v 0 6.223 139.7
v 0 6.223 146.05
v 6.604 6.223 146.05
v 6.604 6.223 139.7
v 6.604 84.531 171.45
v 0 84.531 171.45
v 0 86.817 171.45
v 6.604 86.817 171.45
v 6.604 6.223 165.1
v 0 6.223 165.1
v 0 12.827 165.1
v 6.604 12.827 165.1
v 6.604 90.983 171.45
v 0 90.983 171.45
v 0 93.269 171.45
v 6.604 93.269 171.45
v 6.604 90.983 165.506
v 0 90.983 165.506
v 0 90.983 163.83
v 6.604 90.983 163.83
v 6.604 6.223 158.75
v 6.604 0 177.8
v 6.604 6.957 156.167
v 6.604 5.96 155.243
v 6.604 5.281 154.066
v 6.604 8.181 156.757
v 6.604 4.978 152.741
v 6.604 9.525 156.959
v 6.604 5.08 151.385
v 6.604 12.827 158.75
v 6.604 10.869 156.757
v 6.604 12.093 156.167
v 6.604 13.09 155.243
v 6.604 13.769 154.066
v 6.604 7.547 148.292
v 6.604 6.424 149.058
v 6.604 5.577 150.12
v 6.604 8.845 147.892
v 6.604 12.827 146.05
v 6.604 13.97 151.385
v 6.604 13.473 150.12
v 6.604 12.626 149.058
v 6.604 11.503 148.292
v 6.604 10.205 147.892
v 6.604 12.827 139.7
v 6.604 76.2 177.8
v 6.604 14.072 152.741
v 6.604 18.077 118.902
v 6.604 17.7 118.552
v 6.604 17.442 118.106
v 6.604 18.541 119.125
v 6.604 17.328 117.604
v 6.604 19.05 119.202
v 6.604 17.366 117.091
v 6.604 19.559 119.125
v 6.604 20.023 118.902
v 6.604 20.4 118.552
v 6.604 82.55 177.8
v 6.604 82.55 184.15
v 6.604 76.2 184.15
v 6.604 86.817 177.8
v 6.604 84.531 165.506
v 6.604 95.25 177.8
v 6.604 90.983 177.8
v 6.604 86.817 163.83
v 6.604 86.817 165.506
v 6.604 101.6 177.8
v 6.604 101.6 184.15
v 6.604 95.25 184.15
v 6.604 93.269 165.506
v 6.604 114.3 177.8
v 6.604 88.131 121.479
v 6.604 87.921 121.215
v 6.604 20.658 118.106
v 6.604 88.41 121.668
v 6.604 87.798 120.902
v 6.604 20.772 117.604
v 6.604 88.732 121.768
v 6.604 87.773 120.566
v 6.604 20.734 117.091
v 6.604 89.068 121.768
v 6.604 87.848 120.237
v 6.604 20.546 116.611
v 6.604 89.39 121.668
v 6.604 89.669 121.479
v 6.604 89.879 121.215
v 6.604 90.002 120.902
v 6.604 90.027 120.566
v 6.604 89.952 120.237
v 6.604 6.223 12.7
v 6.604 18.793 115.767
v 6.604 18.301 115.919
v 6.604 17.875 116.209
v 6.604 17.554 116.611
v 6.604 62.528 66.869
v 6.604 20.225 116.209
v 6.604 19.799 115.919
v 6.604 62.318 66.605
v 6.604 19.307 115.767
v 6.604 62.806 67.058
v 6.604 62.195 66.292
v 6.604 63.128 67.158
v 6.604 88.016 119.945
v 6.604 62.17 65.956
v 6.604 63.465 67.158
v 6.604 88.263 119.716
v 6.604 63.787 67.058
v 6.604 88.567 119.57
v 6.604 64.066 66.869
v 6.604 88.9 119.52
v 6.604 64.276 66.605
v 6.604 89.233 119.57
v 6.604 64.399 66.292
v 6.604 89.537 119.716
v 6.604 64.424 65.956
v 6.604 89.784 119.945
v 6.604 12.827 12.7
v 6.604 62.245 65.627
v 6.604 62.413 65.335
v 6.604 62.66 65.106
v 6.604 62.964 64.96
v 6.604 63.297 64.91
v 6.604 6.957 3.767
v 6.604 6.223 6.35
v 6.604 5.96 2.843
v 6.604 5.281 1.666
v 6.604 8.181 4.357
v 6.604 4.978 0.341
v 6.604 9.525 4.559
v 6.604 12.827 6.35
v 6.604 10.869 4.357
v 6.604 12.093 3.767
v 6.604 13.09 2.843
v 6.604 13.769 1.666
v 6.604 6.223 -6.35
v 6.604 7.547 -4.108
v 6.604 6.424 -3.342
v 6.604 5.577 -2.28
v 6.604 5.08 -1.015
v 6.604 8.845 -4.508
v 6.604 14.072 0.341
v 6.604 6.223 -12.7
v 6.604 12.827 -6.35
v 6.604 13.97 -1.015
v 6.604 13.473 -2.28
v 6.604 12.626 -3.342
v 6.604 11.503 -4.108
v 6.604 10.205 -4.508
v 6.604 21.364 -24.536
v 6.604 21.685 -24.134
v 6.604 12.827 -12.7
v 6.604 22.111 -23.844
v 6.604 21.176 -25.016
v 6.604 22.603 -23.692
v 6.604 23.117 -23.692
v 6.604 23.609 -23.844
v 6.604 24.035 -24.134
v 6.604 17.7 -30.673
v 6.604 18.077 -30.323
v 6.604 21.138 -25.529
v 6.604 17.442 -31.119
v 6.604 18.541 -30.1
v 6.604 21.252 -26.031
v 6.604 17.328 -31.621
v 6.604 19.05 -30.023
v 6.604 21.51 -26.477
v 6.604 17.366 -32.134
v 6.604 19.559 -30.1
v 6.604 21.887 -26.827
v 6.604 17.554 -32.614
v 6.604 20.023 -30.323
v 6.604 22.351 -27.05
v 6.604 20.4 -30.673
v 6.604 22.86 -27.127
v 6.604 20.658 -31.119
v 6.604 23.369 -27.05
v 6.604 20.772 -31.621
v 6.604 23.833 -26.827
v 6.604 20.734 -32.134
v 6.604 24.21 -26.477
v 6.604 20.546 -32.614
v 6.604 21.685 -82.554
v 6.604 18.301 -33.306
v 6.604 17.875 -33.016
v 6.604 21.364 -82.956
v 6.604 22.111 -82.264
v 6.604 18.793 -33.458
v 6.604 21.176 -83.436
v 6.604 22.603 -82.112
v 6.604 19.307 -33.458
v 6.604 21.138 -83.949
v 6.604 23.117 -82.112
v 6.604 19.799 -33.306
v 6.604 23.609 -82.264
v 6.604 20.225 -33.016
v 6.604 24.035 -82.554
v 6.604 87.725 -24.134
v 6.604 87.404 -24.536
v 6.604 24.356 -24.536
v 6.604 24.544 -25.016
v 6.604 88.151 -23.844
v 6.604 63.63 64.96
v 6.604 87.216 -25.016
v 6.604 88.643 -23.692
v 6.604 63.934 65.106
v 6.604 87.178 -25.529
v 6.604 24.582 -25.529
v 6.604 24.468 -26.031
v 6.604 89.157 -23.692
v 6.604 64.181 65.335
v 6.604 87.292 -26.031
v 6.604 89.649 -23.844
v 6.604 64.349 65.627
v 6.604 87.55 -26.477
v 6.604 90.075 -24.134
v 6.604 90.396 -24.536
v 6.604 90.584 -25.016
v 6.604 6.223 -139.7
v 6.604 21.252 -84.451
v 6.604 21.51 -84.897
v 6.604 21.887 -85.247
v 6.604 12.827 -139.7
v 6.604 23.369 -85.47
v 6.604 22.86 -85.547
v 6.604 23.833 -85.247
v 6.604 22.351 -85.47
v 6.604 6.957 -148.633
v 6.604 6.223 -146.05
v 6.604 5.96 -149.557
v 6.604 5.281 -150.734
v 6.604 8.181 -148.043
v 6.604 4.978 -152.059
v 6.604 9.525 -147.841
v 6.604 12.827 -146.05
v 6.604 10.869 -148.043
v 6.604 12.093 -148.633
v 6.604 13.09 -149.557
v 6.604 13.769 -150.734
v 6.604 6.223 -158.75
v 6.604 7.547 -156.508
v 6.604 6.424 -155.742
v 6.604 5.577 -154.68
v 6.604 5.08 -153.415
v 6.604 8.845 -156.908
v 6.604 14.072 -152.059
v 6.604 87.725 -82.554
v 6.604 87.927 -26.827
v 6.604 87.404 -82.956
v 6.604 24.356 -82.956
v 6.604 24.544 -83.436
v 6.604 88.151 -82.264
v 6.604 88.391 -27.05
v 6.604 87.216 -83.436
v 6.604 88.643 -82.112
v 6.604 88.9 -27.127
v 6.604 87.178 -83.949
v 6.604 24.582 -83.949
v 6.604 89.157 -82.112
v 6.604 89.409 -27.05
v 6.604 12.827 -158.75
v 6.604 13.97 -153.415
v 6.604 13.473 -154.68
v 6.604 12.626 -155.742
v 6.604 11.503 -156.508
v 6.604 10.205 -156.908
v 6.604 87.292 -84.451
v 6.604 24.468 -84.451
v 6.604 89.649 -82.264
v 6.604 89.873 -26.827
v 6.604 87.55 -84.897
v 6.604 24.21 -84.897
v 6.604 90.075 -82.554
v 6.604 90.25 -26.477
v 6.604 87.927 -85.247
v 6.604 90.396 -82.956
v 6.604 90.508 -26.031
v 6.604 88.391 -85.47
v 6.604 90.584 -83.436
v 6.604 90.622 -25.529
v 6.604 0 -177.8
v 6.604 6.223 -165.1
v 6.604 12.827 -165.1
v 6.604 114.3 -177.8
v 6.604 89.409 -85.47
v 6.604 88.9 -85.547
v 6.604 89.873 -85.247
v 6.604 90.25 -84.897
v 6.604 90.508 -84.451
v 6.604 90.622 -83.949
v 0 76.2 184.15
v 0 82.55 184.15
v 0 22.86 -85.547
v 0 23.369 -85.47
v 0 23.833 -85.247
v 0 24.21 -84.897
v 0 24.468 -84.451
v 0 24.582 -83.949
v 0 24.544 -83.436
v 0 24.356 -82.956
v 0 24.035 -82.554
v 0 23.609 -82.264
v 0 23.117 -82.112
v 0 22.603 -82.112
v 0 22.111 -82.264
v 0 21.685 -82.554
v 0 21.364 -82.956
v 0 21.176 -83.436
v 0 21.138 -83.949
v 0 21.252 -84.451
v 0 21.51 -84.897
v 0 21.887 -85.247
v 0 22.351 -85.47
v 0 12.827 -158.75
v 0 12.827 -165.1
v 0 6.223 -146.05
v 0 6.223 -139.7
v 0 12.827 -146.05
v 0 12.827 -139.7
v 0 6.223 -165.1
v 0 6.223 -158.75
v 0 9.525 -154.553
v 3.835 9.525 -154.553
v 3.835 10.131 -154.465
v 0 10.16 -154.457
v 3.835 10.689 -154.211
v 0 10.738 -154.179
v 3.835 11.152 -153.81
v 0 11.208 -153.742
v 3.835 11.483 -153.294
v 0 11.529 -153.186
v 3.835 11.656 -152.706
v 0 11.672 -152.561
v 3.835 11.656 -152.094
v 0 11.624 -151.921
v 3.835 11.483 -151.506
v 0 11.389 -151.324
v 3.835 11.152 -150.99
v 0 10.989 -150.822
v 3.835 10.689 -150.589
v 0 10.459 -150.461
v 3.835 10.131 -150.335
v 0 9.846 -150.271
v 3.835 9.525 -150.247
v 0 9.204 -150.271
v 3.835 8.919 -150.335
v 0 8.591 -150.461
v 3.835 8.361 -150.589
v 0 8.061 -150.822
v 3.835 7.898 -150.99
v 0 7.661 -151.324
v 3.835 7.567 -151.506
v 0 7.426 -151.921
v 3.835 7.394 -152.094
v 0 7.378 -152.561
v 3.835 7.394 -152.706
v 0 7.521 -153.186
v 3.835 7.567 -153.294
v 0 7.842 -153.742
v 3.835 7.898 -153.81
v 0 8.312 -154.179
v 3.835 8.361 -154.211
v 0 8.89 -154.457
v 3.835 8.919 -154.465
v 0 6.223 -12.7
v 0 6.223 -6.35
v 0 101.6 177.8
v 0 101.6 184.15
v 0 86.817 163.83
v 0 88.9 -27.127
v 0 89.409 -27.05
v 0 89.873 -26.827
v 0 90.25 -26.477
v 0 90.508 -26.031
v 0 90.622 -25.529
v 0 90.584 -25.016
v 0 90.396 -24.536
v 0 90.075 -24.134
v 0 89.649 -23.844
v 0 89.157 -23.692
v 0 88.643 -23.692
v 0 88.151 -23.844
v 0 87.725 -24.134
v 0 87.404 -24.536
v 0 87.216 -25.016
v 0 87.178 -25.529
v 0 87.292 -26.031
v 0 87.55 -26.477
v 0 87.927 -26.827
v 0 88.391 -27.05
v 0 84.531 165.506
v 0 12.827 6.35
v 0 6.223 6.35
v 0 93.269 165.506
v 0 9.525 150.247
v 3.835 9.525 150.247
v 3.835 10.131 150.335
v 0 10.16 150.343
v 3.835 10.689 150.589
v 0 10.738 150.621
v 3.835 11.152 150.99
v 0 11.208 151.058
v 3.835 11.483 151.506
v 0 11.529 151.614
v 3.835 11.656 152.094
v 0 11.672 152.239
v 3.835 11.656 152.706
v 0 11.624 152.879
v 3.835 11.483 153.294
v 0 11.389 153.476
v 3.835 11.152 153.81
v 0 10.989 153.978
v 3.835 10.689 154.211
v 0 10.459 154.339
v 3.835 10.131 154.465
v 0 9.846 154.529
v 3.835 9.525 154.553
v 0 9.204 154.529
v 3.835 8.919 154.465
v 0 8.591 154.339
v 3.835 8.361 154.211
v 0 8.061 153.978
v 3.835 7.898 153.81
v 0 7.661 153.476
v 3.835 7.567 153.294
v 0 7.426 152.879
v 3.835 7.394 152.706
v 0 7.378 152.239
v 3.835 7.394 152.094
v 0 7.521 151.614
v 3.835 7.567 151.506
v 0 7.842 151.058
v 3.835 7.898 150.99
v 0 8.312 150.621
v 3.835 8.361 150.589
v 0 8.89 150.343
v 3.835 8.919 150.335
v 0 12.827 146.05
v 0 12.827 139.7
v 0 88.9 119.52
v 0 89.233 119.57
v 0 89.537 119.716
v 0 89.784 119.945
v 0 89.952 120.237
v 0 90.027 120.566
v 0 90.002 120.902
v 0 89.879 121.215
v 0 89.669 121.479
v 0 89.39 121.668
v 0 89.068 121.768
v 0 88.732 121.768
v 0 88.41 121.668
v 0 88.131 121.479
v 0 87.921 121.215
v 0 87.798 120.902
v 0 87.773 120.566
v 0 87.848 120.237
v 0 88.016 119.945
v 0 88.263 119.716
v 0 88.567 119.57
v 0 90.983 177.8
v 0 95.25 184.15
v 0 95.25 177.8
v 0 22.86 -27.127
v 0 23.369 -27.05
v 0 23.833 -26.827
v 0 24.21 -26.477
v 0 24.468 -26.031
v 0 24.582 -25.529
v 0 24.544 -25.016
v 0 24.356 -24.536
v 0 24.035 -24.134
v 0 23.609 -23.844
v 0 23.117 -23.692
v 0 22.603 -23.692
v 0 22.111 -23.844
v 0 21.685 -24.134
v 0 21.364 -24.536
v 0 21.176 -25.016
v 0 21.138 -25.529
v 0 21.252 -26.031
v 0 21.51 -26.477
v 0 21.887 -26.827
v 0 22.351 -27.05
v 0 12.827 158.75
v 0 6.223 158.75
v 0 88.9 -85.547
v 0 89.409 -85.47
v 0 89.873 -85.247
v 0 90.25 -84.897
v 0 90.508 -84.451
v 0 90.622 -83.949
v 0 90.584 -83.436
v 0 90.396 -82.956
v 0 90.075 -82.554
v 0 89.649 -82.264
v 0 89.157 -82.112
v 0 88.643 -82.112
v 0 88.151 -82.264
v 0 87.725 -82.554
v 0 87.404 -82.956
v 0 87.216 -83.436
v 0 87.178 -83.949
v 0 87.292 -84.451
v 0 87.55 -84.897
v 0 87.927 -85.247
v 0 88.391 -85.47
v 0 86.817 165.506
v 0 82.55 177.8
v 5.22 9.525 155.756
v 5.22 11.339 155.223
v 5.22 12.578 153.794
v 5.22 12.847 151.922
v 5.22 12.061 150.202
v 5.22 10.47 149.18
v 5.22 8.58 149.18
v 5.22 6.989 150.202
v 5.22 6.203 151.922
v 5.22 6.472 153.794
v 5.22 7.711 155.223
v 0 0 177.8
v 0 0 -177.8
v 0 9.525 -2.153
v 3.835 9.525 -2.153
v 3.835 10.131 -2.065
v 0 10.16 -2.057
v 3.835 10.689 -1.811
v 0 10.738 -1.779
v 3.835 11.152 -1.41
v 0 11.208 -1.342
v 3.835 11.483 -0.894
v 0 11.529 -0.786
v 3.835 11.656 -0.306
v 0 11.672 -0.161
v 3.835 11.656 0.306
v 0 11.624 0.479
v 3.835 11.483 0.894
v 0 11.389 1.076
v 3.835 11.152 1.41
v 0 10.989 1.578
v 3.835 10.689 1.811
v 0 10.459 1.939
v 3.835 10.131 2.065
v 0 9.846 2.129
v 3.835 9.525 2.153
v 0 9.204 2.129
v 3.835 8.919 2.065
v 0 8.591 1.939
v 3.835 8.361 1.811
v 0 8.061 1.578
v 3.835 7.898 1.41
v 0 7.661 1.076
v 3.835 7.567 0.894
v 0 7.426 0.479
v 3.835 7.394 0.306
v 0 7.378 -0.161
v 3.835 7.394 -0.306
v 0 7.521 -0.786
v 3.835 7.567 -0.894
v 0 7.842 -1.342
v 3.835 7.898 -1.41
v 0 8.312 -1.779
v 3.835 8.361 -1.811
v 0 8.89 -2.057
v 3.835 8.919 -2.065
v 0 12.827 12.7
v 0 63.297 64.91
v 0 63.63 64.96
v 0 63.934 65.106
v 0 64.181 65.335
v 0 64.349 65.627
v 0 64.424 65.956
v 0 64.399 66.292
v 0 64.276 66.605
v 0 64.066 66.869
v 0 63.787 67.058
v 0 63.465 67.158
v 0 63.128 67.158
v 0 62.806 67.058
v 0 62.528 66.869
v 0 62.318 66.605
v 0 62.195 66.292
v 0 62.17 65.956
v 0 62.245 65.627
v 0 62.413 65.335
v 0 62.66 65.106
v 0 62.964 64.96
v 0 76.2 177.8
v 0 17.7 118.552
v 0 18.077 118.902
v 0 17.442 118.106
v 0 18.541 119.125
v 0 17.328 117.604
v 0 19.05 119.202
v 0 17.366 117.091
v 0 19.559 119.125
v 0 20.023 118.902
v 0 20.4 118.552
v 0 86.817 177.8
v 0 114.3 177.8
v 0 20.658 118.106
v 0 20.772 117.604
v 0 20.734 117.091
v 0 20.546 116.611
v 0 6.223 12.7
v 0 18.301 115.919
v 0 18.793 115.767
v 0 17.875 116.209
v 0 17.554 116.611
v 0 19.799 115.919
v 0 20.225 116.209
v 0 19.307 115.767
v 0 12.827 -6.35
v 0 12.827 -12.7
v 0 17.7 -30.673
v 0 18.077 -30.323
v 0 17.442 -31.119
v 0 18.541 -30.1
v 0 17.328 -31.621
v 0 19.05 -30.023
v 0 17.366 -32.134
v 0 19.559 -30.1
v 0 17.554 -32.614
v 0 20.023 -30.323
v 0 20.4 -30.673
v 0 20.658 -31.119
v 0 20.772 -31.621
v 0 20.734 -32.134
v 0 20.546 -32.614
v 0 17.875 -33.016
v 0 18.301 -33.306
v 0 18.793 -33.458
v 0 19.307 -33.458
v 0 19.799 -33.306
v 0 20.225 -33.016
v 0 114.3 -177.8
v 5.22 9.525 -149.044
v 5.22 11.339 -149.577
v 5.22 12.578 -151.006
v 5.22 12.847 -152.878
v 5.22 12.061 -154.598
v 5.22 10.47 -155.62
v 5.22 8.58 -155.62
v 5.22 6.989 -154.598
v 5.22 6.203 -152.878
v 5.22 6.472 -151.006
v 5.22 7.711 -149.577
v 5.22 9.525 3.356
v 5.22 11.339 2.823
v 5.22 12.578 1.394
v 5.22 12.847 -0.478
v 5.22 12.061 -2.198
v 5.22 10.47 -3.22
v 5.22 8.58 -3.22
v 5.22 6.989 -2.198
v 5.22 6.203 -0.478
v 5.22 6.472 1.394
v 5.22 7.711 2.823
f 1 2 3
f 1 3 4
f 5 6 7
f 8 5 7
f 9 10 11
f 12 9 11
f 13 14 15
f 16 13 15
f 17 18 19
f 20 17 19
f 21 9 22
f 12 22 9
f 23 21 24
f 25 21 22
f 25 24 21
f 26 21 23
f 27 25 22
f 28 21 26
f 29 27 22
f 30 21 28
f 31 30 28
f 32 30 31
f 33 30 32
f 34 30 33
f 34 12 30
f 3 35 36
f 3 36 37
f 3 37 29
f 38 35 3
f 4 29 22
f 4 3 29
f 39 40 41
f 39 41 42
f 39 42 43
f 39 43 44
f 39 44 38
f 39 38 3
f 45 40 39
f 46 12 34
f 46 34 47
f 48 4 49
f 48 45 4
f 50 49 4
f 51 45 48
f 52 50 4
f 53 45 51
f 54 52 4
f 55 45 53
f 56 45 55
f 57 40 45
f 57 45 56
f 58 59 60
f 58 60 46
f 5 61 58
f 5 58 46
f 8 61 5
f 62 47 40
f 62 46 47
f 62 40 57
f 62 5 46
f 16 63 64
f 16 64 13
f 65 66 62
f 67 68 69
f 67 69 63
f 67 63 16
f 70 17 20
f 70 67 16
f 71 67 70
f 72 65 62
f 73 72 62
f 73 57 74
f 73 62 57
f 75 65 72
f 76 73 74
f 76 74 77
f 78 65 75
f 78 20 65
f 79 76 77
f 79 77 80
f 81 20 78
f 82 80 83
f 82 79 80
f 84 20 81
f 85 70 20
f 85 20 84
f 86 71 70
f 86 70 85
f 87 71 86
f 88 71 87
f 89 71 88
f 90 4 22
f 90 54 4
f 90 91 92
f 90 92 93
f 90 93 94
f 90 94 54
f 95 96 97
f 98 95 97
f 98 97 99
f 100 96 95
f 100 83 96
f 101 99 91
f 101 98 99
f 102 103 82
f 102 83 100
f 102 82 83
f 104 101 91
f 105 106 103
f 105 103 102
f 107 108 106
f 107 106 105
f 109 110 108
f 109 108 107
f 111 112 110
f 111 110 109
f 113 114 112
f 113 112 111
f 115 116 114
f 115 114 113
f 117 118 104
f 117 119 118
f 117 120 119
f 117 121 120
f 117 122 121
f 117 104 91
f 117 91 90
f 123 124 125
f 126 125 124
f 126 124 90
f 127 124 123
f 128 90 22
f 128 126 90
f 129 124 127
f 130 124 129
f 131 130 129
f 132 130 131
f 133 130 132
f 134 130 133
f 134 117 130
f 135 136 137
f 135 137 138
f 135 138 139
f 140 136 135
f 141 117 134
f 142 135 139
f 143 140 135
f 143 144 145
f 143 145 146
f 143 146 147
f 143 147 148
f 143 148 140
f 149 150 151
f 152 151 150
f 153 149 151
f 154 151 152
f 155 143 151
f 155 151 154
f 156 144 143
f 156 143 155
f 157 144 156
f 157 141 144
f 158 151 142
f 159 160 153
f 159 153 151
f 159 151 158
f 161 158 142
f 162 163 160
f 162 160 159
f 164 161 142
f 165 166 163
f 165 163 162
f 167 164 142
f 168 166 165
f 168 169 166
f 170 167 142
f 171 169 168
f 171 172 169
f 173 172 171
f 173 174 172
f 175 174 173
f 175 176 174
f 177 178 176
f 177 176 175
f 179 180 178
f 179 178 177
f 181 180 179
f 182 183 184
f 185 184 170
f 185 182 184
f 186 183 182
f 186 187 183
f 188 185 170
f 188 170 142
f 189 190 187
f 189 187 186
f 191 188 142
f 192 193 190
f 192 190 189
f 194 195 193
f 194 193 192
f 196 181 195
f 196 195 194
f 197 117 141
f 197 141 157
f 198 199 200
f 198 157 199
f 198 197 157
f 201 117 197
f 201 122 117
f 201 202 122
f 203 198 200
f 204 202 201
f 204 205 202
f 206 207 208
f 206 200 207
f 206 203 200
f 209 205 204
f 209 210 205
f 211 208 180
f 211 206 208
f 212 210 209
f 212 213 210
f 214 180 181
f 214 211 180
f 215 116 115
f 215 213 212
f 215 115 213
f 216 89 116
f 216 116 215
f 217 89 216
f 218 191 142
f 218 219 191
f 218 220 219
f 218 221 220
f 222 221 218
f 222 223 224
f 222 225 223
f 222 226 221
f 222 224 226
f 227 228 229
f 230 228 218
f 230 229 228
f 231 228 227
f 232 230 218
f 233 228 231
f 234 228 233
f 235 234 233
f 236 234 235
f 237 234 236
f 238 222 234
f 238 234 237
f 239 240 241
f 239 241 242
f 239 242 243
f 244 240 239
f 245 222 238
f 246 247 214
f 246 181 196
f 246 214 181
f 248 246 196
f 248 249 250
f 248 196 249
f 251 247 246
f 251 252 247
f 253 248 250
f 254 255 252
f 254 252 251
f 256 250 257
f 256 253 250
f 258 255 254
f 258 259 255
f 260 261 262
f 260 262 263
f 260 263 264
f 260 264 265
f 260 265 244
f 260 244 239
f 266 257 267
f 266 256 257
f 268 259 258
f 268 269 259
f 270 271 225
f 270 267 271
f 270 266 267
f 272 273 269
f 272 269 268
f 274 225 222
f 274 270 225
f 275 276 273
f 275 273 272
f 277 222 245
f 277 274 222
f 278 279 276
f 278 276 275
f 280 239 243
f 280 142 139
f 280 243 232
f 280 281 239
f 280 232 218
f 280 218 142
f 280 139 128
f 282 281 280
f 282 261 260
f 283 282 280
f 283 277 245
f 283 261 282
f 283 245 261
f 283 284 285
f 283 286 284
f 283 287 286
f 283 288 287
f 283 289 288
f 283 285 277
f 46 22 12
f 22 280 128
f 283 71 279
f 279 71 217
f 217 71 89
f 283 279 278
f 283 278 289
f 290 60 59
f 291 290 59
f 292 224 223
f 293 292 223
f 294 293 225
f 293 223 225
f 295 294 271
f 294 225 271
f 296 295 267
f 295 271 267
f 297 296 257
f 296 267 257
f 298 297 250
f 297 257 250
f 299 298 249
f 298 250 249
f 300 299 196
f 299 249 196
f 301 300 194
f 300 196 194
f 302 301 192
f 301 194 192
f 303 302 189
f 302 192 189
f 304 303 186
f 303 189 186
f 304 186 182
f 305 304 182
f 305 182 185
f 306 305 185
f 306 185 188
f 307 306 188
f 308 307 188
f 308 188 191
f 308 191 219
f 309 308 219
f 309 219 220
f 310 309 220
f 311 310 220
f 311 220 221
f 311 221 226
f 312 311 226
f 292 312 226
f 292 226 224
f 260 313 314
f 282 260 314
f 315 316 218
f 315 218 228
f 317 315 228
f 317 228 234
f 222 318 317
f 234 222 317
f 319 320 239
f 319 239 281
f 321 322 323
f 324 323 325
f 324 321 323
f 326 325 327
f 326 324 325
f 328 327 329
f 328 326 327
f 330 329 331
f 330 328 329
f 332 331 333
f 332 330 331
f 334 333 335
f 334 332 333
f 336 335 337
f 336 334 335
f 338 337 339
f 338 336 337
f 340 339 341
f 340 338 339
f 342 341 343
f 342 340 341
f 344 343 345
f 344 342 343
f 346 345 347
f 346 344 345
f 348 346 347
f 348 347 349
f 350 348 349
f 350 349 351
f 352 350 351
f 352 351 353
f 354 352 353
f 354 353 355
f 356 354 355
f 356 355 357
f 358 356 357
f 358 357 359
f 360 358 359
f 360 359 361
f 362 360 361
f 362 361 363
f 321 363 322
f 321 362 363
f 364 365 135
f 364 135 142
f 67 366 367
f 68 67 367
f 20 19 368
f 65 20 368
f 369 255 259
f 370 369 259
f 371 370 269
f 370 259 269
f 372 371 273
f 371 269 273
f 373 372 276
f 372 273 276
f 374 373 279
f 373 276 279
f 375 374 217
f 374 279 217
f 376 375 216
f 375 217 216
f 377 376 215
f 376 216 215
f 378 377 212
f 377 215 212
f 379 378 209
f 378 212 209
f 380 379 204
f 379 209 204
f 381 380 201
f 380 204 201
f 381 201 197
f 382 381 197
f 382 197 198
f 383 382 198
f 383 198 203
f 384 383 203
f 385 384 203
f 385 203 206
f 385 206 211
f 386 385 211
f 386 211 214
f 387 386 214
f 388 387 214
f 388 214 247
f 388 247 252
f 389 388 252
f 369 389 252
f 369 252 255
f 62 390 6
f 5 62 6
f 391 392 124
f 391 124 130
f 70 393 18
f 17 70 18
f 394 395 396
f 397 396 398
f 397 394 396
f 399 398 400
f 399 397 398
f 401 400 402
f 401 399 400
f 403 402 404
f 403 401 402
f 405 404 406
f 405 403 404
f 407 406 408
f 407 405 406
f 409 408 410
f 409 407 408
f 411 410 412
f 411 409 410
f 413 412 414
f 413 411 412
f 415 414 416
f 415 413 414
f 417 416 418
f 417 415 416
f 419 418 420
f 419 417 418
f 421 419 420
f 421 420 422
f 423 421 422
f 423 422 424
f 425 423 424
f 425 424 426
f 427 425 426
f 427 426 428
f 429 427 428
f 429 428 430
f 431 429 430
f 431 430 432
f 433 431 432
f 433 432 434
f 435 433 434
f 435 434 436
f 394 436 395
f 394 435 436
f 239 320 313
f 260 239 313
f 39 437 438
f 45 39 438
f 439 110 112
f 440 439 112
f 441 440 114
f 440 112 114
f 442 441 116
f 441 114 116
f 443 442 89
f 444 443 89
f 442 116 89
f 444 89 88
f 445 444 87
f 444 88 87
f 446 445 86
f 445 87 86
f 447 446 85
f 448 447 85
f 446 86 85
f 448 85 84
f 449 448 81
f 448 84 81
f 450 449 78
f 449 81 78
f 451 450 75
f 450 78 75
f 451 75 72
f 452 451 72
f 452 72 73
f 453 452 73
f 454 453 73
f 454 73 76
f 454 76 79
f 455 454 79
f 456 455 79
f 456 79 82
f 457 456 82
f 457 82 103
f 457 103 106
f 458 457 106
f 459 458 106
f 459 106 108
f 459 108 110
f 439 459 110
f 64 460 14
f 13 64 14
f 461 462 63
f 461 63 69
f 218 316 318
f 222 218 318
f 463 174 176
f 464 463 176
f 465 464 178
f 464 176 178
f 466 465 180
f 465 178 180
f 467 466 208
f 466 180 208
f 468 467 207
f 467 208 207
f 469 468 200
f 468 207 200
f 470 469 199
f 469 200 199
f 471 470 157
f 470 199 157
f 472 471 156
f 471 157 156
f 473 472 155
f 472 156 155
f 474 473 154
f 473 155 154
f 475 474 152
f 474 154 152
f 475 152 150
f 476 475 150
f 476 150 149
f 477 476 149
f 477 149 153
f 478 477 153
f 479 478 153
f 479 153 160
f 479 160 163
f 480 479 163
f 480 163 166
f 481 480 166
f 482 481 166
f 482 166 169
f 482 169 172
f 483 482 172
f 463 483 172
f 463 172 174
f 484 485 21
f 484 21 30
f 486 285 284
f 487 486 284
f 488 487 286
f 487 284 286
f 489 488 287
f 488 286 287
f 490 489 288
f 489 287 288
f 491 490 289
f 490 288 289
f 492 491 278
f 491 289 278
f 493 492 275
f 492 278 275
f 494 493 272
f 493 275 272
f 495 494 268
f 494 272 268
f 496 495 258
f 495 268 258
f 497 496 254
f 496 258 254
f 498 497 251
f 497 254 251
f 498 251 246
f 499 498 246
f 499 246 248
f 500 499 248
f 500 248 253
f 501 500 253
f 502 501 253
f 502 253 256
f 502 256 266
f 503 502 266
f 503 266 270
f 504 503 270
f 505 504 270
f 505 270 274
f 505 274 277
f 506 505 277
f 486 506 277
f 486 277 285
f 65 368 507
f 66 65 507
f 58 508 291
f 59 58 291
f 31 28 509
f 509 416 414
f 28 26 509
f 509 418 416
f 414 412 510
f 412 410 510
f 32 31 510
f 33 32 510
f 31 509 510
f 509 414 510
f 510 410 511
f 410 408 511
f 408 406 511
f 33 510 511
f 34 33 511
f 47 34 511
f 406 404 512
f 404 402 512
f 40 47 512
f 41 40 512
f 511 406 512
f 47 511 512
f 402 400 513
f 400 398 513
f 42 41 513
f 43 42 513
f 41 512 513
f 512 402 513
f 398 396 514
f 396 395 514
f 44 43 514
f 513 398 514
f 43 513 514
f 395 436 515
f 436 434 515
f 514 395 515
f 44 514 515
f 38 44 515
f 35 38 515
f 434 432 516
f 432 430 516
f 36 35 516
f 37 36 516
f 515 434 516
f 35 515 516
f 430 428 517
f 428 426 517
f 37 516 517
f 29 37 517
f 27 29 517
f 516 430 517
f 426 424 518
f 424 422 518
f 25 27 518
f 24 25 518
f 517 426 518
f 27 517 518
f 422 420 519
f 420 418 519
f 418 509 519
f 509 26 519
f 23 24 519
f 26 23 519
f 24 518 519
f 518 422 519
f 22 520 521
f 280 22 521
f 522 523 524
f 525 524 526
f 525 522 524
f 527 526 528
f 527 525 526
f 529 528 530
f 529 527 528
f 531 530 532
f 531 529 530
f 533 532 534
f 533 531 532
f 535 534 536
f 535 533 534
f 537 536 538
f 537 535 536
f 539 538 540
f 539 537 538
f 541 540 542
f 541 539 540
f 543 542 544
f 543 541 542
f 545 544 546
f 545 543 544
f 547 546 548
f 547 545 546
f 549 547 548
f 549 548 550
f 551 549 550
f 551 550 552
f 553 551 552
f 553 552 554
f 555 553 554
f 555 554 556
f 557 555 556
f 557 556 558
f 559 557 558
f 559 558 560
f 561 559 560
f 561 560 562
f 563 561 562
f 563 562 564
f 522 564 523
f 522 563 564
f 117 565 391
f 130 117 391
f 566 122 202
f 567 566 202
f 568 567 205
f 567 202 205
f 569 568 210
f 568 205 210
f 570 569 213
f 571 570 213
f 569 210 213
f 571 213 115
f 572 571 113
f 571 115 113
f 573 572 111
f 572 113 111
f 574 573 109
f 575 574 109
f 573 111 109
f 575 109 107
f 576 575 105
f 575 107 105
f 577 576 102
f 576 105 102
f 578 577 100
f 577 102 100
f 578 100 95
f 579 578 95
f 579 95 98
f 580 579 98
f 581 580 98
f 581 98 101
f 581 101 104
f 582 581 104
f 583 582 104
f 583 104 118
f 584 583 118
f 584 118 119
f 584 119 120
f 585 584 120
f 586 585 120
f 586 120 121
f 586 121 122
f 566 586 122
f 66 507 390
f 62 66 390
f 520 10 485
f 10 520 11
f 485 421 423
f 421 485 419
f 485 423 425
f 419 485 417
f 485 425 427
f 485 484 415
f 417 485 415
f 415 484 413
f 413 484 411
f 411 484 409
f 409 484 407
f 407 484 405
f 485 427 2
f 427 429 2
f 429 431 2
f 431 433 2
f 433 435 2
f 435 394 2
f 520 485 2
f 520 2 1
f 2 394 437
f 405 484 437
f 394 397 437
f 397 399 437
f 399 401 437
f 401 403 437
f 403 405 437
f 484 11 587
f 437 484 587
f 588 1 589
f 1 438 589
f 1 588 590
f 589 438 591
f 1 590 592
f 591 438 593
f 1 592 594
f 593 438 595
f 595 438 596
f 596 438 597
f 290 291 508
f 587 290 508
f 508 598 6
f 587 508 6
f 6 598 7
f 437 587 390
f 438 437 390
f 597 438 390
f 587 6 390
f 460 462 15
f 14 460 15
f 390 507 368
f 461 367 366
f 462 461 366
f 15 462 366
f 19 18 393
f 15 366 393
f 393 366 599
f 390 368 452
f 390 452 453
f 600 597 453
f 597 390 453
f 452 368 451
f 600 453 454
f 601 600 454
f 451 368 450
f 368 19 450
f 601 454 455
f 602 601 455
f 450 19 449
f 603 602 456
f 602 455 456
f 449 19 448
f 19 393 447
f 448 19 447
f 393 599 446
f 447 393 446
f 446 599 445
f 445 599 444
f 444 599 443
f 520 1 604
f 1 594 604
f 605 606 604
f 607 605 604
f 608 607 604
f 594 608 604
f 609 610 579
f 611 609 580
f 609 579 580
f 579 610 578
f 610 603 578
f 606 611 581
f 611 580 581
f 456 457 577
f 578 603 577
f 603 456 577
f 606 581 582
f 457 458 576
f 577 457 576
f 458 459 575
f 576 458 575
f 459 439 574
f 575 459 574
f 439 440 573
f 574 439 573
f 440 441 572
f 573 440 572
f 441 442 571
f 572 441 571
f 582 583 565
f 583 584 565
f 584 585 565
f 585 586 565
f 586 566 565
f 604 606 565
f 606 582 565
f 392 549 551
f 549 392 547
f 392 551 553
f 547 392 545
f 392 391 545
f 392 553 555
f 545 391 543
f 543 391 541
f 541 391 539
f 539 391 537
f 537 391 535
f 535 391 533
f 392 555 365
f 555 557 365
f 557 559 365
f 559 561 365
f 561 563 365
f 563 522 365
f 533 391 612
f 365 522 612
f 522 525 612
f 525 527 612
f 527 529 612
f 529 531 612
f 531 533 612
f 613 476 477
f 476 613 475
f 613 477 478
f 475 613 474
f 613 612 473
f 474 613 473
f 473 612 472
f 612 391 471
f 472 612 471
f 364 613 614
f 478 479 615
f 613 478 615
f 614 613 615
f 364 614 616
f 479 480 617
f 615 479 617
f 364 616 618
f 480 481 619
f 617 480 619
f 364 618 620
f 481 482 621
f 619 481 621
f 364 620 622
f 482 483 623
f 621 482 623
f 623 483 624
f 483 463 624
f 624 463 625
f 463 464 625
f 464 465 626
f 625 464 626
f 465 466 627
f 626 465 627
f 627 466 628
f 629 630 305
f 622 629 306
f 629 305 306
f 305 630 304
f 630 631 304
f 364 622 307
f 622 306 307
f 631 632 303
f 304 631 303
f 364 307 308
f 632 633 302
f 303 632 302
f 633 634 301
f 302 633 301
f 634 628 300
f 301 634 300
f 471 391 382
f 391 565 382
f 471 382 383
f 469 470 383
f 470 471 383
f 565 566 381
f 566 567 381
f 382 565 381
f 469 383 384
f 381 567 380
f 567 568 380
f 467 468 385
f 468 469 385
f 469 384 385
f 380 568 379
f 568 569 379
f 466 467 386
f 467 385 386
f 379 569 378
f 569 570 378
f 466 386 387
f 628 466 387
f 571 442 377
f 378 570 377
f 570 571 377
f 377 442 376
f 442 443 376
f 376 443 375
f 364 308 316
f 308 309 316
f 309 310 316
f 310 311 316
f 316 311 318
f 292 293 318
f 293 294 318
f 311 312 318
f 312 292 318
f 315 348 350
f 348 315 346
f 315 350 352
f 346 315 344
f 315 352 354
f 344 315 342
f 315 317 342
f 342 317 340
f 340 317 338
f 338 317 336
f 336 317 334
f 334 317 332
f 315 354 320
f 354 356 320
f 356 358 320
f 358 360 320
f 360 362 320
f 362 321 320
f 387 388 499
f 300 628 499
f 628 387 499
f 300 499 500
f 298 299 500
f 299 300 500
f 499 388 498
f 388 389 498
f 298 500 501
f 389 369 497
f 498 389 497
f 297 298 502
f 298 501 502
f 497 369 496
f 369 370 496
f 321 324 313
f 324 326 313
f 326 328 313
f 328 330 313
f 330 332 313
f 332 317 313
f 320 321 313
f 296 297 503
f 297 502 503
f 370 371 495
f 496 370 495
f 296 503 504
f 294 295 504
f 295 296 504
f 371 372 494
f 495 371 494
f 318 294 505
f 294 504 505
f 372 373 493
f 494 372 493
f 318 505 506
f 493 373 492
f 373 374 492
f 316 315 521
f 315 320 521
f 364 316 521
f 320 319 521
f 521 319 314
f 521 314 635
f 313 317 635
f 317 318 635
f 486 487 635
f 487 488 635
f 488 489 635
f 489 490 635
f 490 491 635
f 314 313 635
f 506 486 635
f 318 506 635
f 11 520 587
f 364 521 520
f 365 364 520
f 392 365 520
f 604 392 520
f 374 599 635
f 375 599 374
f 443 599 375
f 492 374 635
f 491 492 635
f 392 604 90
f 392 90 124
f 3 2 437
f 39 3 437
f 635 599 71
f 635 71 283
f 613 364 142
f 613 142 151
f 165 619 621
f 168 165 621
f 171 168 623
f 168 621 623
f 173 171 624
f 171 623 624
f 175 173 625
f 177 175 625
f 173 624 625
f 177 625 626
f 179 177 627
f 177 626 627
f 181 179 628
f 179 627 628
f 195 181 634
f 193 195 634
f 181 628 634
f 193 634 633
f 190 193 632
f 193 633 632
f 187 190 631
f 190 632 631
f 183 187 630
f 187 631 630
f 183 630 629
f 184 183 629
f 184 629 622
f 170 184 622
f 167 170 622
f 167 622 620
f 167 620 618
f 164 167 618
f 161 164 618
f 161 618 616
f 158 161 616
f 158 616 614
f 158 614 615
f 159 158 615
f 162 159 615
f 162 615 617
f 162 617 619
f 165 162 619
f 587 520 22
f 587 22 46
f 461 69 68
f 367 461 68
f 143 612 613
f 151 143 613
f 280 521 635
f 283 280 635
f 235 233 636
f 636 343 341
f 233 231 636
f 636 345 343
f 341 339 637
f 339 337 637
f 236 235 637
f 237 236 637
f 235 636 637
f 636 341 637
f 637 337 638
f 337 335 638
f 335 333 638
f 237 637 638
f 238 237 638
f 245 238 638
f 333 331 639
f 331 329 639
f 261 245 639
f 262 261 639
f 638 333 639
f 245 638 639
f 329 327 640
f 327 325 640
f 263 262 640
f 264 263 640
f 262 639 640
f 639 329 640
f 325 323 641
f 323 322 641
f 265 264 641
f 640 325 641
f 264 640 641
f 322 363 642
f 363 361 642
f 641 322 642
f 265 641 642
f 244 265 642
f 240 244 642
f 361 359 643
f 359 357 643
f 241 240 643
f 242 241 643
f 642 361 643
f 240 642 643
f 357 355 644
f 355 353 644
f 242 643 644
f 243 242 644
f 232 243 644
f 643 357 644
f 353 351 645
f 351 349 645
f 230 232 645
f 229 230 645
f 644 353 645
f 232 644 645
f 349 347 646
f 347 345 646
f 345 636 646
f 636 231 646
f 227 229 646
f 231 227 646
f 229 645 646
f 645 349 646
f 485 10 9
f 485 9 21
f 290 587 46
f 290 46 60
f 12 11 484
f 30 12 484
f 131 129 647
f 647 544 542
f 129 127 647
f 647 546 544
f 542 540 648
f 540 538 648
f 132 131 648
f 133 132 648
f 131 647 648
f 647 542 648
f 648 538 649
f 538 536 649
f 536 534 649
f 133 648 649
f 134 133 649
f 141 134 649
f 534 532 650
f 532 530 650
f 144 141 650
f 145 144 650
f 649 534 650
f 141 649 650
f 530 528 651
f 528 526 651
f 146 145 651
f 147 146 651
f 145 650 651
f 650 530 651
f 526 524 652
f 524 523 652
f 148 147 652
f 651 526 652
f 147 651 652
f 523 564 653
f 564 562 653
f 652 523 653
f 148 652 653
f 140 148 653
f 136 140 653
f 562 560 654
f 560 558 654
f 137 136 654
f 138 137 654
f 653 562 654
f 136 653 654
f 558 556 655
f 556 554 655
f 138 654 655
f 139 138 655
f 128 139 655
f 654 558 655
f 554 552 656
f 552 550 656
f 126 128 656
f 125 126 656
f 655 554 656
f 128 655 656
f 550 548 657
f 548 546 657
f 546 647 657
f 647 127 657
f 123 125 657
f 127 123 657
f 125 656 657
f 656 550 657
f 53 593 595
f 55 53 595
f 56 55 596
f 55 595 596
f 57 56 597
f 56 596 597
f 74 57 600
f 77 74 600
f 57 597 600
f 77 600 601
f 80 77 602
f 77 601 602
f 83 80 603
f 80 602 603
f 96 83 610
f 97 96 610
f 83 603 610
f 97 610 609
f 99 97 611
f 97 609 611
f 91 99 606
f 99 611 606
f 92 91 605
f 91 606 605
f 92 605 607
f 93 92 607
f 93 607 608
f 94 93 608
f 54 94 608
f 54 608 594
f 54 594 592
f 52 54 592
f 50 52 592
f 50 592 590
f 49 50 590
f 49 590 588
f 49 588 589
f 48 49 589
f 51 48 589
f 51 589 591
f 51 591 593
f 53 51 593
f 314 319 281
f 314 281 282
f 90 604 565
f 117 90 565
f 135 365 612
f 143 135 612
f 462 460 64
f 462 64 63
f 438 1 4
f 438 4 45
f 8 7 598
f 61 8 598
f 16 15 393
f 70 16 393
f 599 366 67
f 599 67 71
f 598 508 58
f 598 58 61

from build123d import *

# Parameters (mm, degrees)
SKETCH1_W                                         = 355.6
SKETCH1_H                                         = 114.3
SKETCH1_R                                         = 2.15265
SKETCH1_W_2                                       = 6.35
SKETCH1_H_2                                       = 6.604
BOSS_EXTRUDE1_DEPTH                               = 6.604
CUT_EXTRUDE1_DEPTH                                = 7.604
SKETCH6_W                                         = 6.35
SKETCH6_H                                         = 6.35
BOSS_EXTRUDE2_DEPTH                               = 6.604
CSK_FOR_8_FLAT_HEAD_SOCKET_CAP_SCREW2_D           = 4.3053
CSK_FOR_8_FLAT_HEAD_SOCKET_CAP_SCREW2_CSINK_D     = 9.1186
CSK_FOR_8_FLAT_HEAD_SOCKET_CAP_SCREW2_CSINK_ANGLE = 82
F_4_40_TAPPED_HOLE2_D                             = 2.2606
F_4_40_TAPPED_HOLE2_DEPTH                         = 7.5946
F_4_40_TAPPED_HOLE2_TIP                           = 0.679152758
F_8_32_TAPPED_HOLE1_D                             = 3.4544
F_8_32_TAPPED_HOLE1_DEPTH                         = 10.7188
F_8_32_TAPPED_HOLE1_TIP                           = 1.037806461
F_8_32_TAPPED_HOLE2_D                             = 3.4544
F_8_32_TAPPED_HOLE2_DEPTH                         = 10.7188
F_8_32_TAPPED_HOLE2_TIP                           = 1.037806461


with BuildPart() as part:
    # Sketch1 → Boss-Extrude1 (new body)
    with BuildSketch(Plane(origin=(0, 0, 0), x_dir=(0, 0, -1), z_dir=(1, 0, 0))):
        with Locations((0, 57.15)):
            Rectangle(SKETCH1_W, SKETCH1_H)
        with Locations((-152.4, 9.525)):
            Circle(SKETCH1_R, mode=Mode.SUBTRACT)
        with Locations((0, 9.525)):
            Circle(SKETCH1_R, mode=Mode.SUBTRACT)
        with Locations((152.4, 9.525)):
            Circle(SKETCH1_R, mode=Mode.SUBTRACT)
        with Locations((-142.875, 9.525)):
            Rectangle(SKETCH1_W_2, SKETCH1_H_2, mode=Mode.SUBTRACT)
        with Locations((-161.925, 9.525)):
            Rectangle(SKETCH1_W_2, SKETCH1_H_2, mode=Mode.SUBTRACT)
        with Locations((9.525, 9.525)):
            Rectangle(SKETCH1_W_2, SKETCH1_H_2, mode=Mode.SUBTRACT)
        with Locations((-9.525, 9.525)):
            Rectangle(SKETCH1_W_2, SKETCH1_H_2, mode=Mode.SUBTRACT)
        with Locations((161.925, 9.525)):
            Rectangle(SKETCH1_W_2, SKETCH1_H_2, mode=Mode.SUBTRACT)
        with Locations((142.875, 9.525)):
            Rectangle(SKETCH1_W_2, SKETCH1_H_2, mode=Mode.SUBTRACT)
    extrude(amount=BOSS_EXTRUDE1_DEPTH)

    # Sketch5 → Cut-Extrude1 (cut, through all)
    with BuildSketch(Plane.ZY):
        Polygon((177.8, 90.9828), (171.45, 90.9828), (171.45, 93.2688), (165.5064, 93.2688), (165.5064, 90.9828), (163.83, 90.9828), (163.83, 86.8172), (165.5064, 86.8172), (165.5064, 84.5312), (171.45, 84.5312), (171.45, 86.8172), (177.8, 86.8172), align=None)
    extrude(amount=-CUT_EXTRUDE1_DEPTH, mode=Mode.SUBTRACT)

    # Sketch6 → Boss-Extrude2 (add)
    with BuildSketch(Plane.ZY):
        with Locations((180.975, 98.425)):
            Rectangle(SKETCH6_W, SKETCH6_H)
        with Locations((180.975, 79.375)):
            Rectangle(SKETCH6_W, SKETCH6_H)
    extrude(amount=-BOSS_EXTRUDE2_DEPTH)

    # CSK for #8 Flat Head Socket Cap Screw2 (through all)
    with Locations(Plane(origin=(6.604, 0, 0), x_dir=(0, 0, -1), z_dir=(1, 0, 0))):
        with Locations((-152.4, 9.525), (0, 9.525), (152.4, 9.525)):
            CounterSinkHole(CSK_FOR_8_FLAT_HEAD_SOCKET_CAP_SCREW2_D / 2, CSK_FOR_8_FLAT_HEAD_SOCKET_CAP_SCREW2_CSINK_D / 2, counter_sink_angle=CSK_FOR_8_FLAT_HEAD_SOCKET_CAP_SCREW2_CSINK_ANGLE)

    # #4-40 Tapped Hole2
    with Locations(Plane.ZY):
        with Locations((120.65, 88.9), (66.04, 63.2968)):
            Hole(F_4_40_TAPPED_HOLE2_D / 2, depth=F_4_40_TAPPED_HOLE2_DEPTH)
            with Locations((0, 0, -(F_4_40_TAPPED_HOLE2_DEPTH + F_4_40_TAPPED_HOLE2_TIP / 2))):  # 118° drill point
                Cone(0, F_4_40_TAPPED_HOLE2_D / 2, F_4_40_TAPPED_HOLE2_TIP, mode=Mode.SUBTRACT)

    # #8-32 Tapped Hole1
    with Locations(Plane.ZY):
        with Locations((-83.82, 88.9), (-25.4, 88.9), (-83.82, 22.86), (-25.4, 22.86)):
            Hole(F_8_32_TAPPED_HOLE1_D / 2, depth=F_8_32_TAPPED_HOLE1_DEPTH)
            with Locations((0, 0, -(F_8_32_TAPPED_HOLE1_DEPTH + F_8_32_TAPPED_HOLE1_TIP / 2))):  # 118° drill point
                Cone(0, F_8_32_TAPPED_HOLE1_D / 2, F_8_32_TAPPED_HOLE1_TIP, mode=Mode.SUBTRACT)

    # #8-32 Tapped Hole2
    with Locations(Plane(origin=(6.604, 0, 0), x_dir=(0, 0, -1), z_dir=(1, 0, 0))):
        with Locations((-117.475, 19.05), (31.75, 19.05)):
            Hole(F_8_32_TAPPED_HOLE2_D / 2, depth=F_8_32_TAPPED_HOLE2_DEPTH)
            with Locations((0, 0, -(F_8_32_TAPPED_HOLE2_DEPTH + F_8_32_TAPPED_HOLE2_TIP / 2))):  # 118° drill point
                Cone(0, F_8_32_TAPPED_HOLE2_D / 2, F_8_32_TAPPED_HOLE2_TIP, mode=Mode.SUBTRACT)


solid = part.part
